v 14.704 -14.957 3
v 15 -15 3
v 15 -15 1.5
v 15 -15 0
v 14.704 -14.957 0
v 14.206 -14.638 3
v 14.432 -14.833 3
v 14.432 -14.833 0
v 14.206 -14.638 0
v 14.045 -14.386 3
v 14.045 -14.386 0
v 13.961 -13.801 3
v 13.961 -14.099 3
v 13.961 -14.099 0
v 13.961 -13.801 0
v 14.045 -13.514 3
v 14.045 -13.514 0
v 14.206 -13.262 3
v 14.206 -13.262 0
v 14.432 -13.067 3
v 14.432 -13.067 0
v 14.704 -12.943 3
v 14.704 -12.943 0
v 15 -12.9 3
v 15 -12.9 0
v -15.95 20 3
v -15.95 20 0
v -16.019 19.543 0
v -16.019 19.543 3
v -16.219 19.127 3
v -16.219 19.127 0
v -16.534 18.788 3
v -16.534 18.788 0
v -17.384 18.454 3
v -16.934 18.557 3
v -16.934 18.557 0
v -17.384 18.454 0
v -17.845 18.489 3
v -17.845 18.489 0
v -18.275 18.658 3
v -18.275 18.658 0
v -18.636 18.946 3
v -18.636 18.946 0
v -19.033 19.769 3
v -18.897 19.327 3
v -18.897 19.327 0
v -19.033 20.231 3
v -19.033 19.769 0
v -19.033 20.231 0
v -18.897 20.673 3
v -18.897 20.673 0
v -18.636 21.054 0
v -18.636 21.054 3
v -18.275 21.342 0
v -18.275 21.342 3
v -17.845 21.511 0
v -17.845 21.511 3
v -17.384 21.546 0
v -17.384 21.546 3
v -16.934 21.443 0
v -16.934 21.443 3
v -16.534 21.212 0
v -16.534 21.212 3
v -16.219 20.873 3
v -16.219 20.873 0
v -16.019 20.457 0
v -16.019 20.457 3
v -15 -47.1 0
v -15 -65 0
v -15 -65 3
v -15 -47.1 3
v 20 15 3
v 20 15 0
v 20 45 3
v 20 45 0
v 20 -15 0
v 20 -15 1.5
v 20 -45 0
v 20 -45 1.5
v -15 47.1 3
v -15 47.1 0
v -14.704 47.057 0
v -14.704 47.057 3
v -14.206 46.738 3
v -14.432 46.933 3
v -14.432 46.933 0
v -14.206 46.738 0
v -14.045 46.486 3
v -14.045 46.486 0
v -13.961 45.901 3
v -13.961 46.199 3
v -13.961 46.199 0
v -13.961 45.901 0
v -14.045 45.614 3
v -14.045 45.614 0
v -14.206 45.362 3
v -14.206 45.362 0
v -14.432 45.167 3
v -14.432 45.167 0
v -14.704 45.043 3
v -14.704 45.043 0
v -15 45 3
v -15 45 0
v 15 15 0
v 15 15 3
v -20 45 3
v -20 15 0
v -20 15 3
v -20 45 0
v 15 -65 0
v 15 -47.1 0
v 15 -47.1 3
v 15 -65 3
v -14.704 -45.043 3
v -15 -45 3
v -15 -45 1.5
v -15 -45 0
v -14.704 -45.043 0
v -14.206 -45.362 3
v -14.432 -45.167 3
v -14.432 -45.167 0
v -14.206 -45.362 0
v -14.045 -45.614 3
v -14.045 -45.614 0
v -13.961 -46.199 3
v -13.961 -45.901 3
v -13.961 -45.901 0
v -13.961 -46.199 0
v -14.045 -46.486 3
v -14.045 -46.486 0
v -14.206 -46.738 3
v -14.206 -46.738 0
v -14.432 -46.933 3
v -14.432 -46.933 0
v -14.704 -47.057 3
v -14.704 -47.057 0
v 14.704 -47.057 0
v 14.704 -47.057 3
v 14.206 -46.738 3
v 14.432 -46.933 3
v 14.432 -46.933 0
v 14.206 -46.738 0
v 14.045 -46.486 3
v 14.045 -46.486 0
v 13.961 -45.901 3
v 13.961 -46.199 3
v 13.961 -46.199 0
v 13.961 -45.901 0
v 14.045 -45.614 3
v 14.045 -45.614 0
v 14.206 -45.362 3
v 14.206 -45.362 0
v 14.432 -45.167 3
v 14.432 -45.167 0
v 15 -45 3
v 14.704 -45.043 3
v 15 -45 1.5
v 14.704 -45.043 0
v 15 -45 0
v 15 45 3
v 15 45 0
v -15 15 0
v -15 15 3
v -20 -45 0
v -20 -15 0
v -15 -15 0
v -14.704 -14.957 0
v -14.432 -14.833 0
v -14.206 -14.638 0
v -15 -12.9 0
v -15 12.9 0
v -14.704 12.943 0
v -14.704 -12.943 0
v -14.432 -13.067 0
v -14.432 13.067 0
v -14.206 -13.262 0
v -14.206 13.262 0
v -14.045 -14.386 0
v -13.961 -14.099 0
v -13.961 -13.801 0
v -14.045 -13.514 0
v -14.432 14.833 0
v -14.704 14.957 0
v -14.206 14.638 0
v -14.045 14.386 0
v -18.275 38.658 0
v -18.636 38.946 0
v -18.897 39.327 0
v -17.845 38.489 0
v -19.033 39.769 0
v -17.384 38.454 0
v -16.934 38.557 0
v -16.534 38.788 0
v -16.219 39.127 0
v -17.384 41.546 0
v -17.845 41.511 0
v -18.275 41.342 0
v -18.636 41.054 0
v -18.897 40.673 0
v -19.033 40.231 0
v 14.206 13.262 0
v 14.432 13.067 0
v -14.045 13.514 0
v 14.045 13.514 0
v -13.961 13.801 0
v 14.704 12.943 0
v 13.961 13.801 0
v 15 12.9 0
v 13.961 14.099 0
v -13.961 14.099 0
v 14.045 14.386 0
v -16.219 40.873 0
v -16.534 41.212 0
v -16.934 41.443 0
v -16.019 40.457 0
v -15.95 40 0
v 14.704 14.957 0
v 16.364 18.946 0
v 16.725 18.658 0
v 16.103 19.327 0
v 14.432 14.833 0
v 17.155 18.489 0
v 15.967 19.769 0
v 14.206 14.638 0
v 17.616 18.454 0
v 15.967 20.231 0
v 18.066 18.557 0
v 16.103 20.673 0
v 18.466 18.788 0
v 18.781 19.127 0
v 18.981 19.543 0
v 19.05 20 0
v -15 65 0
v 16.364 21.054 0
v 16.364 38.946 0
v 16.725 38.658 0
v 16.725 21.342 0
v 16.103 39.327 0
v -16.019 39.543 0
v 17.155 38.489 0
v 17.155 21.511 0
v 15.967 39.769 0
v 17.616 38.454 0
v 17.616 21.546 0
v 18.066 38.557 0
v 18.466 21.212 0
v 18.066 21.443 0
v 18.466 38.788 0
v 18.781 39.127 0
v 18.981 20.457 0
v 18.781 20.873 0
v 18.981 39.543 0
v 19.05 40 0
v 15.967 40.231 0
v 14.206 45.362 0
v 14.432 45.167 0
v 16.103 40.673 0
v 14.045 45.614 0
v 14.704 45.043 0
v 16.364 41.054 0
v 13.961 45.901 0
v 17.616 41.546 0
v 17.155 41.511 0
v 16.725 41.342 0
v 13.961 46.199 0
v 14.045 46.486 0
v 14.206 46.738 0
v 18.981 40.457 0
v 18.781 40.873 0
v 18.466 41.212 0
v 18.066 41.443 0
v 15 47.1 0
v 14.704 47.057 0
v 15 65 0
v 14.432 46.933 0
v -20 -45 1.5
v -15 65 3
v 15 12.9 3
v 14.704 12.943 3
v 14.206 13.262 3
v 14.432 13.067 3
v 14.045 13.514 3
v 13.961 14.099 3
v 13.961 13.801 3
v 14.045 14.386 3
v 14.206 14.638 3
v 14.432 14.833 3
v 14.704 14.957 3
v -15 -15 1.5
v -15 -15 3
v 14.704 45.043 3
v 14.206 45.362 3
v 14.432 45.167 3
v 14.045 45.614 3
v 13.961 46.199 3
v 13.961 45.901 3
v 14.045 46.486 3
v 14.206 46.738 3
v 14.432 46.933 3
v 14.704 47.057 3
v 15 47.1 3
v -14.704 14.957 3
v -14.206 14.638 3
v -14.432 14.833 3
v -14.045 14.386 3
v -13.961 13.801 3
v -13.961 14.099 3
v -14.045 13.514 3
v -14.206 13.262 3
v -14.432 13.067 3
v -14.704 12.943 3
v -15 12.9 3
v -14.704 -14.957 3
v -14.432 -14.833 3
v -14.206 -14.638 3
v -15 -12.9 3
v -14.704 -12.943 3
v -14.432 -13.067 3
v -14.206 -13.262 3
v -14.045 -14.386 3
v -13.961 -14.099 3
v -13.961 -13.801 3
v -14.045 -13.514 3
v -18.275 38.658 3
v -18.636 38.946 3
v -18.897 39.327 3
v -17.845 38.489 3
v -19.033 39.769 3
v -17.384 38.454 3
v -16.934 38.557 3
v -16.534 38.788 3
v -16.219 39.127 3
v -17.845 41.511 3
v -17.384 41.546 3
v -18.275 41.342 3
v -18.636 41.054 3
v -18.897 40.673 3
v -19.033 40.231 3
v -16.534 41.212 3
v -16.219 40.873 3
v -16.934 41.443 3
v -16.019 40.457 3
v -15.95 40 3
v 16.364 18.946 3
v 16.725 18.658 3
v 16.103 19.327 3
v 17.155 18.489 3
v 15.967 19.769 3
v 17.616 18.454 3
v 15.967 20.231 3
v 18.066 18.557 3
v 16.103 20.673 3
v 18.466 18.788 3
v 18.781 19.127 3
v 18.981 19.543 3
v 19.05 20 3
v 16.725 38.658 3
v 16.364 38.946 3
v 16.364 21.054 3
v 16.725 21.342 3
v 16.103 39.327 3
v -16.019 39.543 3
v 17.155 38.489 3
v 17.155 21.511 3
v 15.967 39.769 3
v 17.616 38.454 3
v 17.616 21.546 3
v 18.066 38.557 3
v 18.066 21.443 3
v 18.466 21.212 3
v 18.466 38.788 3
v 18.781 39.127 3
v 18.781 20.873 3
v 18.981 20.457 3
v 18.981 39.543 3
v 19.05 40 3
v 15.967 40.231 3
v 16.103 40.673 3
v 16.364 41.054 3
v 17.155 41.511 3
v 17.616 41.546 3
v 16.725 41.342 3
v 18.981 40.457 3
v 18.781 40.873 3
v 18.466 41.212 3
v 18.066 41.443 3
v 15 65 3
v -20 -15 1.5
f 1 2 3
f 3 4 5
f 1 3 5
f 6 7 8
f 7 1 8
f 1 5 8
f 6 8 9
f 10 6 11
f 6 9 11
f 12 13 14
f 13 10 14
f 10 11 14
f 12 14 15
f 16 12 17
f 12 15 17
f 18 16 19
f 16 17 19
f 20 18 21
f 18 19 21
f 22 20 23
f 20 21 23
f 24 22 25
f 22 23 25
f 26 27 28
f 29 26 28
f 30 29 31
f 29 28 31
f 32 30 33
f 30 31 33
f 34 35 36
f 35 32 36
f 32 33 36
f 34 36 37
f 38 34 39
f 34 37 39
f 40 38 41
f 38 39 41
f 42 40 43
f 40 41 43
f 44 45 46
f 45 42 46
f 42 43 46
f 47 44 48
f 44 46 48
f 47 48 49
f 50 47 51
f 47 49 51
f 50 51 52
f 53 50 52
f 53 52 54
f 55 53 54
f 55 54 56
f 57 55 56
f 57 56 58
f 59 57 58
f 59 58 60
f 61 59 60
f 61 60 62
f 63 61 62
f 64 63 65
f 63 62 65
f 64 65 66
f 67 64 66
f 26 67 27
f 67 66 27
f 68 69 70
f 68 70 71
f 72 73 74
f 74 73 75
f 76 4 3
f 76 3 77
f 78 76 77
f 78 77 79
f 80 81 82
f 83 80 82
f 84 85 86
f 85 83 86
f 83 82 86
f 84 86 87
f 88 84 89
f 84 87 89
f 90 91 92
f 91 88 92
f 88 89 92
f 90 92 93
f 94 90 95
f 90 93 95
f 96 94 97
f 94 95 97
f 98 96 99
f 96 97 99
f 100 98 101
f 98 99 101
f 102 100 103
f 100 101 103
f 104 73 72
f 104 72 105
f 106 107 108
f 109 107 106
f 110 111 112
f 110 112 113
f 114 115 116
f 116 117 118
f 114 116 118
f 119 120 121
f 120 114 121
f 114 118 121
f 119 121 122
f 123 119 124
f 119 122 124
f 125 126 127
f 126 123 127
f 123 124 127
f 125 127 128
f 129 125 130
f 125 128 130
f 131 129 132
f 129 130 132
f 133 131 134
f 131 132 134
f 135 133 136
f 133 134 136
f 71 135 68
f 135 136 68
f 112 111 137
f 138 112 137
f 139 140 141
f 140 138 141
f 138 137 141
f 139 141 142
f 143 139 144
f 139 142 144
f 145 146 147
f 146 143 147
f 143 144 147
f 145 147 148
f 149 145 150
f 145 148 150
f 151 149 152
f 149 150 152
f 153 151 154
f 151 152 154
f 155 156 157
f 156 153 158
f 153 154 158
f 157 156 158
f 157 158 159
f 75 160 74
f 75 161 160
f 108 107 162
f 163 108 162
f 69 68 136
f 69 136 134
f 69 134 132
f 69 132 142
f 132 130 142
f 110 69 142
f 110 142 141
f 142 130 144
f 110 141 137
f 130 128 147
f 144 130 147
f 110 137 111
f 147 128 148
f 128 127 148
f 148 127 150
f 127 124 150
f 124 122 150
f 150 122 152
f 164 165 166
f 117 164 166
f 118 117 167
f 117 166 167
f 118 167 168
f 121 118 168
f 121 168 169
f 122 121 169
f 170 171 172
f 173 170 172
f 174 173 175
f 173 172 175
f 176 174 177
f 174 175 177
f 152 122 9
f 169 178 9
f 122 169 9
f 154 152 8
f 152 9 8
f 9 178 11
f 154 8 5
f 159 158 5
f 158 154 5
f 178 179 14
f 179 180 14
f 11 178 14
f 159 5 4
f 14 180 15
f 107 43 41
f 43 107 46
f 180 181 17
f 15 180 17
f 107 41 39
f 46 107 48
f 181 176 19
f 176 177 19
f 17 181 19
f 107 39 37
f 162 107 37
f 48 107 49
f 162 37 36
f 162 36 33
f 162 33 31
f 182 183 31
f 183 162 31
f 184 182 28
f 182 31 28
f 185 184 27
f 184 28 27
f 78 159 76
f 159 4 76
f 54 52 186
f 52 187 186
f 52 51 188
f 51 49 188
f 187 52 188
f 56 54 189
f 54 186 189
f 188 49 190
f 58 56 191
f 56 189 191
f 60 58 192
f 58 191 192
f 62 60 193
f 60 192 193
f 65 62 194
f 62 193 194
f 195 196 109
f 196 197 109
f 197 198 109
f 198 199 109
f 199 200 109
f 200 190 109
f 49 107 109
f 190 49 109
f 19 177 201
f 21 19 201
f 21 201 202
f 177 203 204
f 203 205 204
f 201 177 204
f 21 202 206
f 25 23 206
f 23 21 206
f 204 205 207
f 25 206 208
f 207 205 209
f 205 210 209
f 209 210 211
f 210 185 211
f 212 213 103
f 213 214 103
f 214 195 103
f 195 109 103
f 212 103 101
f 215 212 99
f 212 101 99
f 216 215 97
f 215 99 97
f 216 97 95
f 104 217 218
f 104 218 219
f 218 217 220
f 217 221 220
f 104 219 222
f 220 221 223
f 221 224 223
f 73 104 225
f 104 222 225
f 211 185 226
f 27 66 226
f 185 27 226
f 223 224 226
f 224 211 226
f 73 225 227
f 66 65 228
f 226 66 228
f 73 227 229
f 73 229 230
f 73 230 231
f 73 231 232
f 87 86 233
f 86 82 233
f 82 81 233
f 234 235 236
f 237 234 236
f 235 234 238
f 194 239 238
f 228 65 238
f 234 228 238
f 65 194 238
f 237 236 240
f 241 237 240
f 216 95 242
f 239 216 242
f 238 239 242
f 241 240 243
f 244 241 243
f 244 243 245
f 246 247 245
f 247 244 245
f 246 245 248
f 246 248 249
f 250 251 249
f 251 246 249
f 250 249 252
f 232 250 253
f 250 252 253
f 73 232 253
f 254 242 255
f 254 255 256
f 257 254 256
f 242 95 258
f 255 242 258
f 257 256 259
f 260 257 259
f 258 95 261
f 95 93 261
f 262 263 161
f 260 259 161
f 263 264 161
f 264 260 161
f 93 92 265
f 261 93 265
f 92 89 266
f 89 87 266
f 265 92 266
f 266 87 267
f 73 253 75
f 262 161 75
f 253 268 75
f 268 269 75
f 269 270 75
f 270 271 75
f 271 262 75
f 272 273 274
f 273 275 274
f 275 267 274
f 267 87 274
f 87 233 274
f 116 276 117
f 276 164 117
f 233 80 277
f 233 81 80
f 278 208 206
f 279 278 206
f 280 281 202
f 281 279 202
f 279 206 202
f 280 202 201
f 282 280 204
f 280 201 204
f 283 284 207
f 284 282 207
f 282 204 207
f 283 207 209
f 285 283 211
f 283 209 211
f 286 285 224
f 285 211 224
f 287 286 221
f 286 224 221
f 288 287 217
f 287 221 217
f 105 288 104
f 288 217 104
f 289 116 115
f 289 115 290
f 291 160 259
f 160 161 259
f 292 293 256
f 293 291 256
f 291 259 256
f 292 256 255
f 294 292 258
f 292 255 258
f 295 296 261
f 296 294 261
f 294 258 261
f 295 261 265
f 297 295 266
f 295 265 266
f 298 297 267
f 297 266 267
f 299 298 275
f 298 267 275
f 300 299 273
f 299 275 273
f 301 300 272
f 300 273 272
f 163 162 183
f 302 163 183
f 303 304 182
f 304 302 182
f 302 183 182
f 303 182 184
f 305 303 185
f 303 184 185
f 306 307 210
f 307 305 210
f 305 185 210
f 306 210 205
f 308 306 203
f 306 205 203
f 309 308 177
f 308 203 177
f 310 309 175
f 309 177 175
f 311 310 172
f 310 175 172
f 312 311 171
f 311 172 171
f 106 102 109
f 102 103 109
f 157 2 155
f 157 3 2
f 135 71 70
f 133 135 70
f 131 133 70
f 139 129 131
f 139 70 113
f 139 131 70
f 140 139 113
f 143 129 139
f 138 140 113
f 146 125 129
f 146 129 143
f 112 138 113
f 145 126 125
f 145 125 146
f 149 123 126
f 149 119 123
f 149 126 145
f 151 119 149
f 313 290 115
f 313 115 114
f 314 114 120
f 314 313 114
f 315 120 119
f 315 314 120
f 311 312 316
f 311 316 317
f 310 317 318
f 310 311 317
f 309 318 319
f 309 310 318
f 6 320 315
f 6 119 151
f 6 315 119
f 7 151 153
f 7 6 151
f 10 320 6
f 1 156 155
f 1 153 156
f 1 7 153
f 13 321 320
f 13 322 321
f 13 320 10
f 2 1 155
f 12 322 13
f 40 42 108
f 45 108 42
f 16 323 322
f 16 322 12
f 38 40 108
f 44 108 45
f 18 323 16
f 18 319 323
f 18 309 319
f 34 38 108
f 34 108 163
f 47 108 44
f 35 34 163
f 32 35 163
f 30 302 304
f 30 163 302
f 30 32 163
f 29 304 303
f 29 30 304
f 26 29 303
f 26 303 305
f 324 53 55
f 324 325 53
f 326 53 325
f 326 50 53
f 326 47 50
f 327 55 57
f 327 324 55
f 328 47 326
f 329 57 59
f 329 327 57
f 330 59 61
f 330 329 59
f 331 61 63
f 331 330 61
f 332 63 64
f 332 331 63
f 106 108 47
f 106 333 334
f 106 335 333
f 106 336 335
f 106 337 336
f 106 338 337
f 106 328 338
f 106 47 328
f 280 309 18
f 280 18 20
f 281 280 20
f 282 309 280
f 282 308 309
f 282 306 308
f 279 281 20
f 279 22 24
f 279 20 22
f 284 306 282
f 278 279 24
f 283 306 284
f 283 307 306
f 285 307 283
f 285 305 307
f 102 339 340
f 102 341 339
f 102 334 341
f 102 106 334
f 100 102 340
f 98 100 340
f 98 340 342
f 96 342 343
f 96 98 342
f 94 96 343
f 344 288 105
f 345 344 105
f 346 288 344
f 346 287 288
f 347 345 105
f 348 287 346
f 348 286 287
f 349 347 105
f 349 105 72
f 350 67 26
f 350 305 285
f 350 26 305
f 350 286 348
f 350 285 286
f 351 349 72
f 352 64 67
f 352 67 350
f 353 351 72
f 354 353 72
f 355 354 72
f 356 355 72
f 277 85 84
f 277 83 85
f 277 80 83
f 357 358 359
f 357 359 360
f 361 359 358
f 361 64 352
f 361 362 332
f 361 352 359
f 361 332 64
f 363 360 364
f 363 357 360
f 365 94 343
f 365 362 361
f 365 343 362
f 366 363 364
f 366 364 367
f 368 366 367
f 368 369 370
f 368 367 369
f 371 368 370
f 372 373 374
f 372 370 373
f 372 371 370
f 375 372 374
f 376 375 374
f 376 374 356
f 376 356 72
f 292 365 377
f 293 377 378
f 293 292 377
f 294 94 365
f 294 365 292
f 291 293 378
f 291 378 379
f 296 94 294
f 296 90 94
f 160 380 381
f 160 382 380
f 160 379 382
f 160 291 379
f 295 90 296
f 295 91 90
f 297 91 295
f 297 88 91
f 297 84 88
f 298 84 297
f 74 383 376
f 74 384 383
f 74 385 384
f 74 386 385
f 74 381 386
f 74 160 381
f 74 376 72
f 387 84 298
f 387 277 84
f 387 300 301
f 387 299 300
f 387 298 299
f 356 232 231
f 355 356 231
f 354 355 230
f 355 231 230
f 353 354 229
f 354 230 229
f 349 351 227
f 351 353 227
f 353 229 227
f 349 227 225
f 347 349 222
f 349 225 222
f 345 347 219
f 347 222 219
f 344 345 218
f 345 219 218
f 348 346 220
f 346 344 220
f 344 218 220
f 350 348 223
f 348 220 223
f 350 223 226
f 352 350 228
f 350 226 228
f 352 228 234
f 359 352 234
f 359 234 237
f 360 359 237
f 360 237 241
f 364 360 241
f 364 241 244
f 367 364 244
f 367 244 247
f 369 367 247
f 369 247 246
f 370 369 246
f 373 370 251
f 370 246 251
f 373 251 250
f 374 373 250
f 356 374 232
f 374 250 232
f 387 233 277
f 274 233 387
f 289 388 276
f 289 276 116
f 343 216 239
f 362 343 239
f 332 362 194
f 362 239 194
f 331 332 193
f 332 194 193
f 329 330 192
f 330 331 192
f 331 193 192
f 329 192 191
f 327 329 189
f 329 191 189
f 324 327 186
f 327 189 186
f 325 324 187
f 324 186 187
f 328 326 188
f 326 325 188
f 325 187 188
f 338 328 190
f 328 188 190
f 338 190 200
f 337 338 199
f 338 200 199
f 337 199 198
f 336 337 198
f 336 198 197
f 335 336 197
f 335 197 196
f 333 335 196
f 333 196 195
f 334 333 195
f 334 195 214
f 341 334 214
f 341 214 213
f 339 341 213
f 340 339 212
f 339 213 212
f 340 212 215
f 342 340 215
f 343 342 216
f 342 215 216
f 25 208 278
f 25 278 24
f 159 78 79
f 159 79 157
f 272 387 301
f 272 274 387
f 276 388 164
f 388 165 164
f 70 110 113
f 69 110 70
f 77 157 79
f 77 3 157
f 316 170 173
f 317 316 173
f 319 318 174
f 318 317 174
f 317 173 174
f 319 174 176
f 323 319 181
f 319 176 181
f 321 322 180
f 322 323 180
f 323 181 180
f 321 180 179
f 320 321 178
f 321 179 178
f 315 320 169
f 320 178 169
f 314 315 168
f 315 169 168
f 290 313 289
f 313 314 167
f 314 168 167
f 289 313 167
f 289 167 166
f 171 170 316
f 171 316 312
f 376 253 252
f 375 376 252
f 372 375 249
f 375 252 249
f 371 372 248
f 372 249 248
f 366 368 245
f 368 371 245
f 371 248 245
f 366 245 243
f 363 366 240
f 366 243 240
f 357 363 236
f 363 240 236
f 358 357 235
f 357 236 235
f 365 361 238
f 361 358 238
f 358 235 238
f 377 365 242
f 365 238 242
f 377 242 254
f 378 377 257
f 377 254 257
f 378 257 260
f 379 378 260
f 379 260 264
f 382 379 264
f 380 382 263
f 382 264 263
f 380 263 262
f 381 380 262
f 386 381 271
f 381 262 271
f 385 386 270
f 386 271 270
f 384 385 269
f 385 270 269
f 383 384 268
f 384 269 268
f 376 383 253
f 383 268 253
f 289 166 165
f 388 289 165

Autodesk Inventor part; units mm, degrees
ref_plane "YZ Plane" through (0, 0, 0) normal (1, 0, 0) x (0, 1, 0)
ref_plane "XZ Plane" through (0, 0, 0) normal (0, 1, 0) x (-1, 0, 0)
ref_plane "XY Plane" through (0, 0, 0) normal (0, 0, 1) x (1, 0, 0)
sketch "スケッチ1" plane through (0, 0, 0) normal (0, 0, 1) x (1, 0, 0)
  line L0 (-15, 65) -> (15, 65)
  line L1 (15, 65) -> (15, 47.1)
  line L2 (15, -65) -> (-15, -65)
  line L3 (-15, -65) -> (-15, -47.1)
  line L4 (-15, 65) -> (15, -65) construction
  line L5 (15, 65) -> (-15, -65) construction
  line L6 (-15, 45) -> (-20, 45)
  line L7 (-20, 45) -> (-20, 45)
  line L8 (-20, 15) -> (-15, 15)
  line L9 (-20, 15) -> (-20, 45)
  line L10 (-15, -15) -> (-20, -15)
  line L11 (-20, -15) -> (-20, -45)
  line L12 (-20, -45) -> (-15, -45)
  arc A0 (-15, 45) -> (-15, 47.1) centre (-15, 46.05) ccw
  arc A1 (-15, 12.9) -> (-15, 15) centre (-15, 13.95) ccw
  arc A2 (-15, -15) -> (-15, -12.9) centre (-15, -13.95) ccw
  arc A3 (-15, -47.1) -> (-15, -45) centre (-15, -46.05) ccw
  line L13 (-15, 47.1) -> (-15, 65)
  line L14 (-15, 12.9) -> (-15, 47.1) construction
  line L15 (-15, -12.9) -> (-15, 12.9)
  line L16 (-15, -47.1) -> (-15, -45) construction
  line L17 (0, 65) -> (0, -65) construction
  line L18 (15, 45) -> (20, 45)
  line L19 (20, 15) -> (15, 15)
  line L20 (20, 15) -> (20, 45)
  line L21 (15, -15) -> (20, -15)
  line L22 (20, -15) -> (20, -45)
  line L23 (20, -45) -> (15, -45)
  arc A4 (15, 47.1) -> (15, 45) centre (15, 46.05) ccw
  arc A5 (15, 15) -> (15, 12.9) centre (15, 13.95) ccw
  arc A6 (15, -12.9) -> (15, -15) centre (15, -13.95) ccw
  arc A7 (15, -45) -> (15, -47.1) centre (15, -46.05) ccw
  line L24 (15, 47.1) -> (15, 12.9) construction
  line L25 (15, 12.9) -> (15, -12.9)
  line L26 (15, -47.1) -> (15, -65)
  line L27 (15, -12.9) -> (15, -15) construction
  circle A8 centre (-17.5, 40) radius 1.55
  circle A9 centre (-17.5, 20) radius 1.55
  circle A10 centre (17.5, 20) radius 1.55
  circle A11 centre (17.5, 40) radius 1.55
  line L28 (-15, -15) -> (-15, -12.9) construction
  line L29 (-15, -45) -> (-15, -15)
  line L30 (15, -15) -> (15, -45)
  line L31 (15, -45) -> (15, -47.1) construction
  point P0 (0, 0)
  dimension "d8" = 30
  dimension "d9" = 130
  dimension "d10" = 20
  dimension "d11" = 30
  dimension "d12" = 30
  dimension "d13" = 30
  dimension "d16" = 1.05
  dimension "d17" = 1.05
  dimension "d18" = 1.05
  dimension "d19" = 1.05
  dimension "d20" = 5
  dimension "d23" = 20
  dimension "d24" = 5
  dimension "d25" = 5
  dimension "d28" = 2.5
  dimension "d29" = 2.5
  dimension "d33" = 3.1
  dimension "d38" = 3.1
  dimension "d39" = 20
extrude "押し出し1" add sketch "スケッチ1" along normal blind 1.5
extrude "押し出し2" add sketch "スケッチ1" along normal blind 3 contours L0 L1 A4 L18 L20 L19 A5 L25 A6 L30 A7 L26 L2 L3 A3 L29 A2 L15 A1 L8 L9 L6 A0 L13
equation "\"d10\" = -0.5 * d12 + 0.5 * d9 - d11"
equation "\"d13\" = d11"
equation "\"d17\" = d16"
equation "\"d18\" = d17"
equation "\"d19\" = d18"
equation "\"d25\" = d24"
equation "\"d28\" = 0.5 * d20"
equation "\"d29\" = d28"
equation "\"d33\" = d38"
properties part number "Cockpit_horizontal_frame_03" material "アセタール樹脂、黒"
